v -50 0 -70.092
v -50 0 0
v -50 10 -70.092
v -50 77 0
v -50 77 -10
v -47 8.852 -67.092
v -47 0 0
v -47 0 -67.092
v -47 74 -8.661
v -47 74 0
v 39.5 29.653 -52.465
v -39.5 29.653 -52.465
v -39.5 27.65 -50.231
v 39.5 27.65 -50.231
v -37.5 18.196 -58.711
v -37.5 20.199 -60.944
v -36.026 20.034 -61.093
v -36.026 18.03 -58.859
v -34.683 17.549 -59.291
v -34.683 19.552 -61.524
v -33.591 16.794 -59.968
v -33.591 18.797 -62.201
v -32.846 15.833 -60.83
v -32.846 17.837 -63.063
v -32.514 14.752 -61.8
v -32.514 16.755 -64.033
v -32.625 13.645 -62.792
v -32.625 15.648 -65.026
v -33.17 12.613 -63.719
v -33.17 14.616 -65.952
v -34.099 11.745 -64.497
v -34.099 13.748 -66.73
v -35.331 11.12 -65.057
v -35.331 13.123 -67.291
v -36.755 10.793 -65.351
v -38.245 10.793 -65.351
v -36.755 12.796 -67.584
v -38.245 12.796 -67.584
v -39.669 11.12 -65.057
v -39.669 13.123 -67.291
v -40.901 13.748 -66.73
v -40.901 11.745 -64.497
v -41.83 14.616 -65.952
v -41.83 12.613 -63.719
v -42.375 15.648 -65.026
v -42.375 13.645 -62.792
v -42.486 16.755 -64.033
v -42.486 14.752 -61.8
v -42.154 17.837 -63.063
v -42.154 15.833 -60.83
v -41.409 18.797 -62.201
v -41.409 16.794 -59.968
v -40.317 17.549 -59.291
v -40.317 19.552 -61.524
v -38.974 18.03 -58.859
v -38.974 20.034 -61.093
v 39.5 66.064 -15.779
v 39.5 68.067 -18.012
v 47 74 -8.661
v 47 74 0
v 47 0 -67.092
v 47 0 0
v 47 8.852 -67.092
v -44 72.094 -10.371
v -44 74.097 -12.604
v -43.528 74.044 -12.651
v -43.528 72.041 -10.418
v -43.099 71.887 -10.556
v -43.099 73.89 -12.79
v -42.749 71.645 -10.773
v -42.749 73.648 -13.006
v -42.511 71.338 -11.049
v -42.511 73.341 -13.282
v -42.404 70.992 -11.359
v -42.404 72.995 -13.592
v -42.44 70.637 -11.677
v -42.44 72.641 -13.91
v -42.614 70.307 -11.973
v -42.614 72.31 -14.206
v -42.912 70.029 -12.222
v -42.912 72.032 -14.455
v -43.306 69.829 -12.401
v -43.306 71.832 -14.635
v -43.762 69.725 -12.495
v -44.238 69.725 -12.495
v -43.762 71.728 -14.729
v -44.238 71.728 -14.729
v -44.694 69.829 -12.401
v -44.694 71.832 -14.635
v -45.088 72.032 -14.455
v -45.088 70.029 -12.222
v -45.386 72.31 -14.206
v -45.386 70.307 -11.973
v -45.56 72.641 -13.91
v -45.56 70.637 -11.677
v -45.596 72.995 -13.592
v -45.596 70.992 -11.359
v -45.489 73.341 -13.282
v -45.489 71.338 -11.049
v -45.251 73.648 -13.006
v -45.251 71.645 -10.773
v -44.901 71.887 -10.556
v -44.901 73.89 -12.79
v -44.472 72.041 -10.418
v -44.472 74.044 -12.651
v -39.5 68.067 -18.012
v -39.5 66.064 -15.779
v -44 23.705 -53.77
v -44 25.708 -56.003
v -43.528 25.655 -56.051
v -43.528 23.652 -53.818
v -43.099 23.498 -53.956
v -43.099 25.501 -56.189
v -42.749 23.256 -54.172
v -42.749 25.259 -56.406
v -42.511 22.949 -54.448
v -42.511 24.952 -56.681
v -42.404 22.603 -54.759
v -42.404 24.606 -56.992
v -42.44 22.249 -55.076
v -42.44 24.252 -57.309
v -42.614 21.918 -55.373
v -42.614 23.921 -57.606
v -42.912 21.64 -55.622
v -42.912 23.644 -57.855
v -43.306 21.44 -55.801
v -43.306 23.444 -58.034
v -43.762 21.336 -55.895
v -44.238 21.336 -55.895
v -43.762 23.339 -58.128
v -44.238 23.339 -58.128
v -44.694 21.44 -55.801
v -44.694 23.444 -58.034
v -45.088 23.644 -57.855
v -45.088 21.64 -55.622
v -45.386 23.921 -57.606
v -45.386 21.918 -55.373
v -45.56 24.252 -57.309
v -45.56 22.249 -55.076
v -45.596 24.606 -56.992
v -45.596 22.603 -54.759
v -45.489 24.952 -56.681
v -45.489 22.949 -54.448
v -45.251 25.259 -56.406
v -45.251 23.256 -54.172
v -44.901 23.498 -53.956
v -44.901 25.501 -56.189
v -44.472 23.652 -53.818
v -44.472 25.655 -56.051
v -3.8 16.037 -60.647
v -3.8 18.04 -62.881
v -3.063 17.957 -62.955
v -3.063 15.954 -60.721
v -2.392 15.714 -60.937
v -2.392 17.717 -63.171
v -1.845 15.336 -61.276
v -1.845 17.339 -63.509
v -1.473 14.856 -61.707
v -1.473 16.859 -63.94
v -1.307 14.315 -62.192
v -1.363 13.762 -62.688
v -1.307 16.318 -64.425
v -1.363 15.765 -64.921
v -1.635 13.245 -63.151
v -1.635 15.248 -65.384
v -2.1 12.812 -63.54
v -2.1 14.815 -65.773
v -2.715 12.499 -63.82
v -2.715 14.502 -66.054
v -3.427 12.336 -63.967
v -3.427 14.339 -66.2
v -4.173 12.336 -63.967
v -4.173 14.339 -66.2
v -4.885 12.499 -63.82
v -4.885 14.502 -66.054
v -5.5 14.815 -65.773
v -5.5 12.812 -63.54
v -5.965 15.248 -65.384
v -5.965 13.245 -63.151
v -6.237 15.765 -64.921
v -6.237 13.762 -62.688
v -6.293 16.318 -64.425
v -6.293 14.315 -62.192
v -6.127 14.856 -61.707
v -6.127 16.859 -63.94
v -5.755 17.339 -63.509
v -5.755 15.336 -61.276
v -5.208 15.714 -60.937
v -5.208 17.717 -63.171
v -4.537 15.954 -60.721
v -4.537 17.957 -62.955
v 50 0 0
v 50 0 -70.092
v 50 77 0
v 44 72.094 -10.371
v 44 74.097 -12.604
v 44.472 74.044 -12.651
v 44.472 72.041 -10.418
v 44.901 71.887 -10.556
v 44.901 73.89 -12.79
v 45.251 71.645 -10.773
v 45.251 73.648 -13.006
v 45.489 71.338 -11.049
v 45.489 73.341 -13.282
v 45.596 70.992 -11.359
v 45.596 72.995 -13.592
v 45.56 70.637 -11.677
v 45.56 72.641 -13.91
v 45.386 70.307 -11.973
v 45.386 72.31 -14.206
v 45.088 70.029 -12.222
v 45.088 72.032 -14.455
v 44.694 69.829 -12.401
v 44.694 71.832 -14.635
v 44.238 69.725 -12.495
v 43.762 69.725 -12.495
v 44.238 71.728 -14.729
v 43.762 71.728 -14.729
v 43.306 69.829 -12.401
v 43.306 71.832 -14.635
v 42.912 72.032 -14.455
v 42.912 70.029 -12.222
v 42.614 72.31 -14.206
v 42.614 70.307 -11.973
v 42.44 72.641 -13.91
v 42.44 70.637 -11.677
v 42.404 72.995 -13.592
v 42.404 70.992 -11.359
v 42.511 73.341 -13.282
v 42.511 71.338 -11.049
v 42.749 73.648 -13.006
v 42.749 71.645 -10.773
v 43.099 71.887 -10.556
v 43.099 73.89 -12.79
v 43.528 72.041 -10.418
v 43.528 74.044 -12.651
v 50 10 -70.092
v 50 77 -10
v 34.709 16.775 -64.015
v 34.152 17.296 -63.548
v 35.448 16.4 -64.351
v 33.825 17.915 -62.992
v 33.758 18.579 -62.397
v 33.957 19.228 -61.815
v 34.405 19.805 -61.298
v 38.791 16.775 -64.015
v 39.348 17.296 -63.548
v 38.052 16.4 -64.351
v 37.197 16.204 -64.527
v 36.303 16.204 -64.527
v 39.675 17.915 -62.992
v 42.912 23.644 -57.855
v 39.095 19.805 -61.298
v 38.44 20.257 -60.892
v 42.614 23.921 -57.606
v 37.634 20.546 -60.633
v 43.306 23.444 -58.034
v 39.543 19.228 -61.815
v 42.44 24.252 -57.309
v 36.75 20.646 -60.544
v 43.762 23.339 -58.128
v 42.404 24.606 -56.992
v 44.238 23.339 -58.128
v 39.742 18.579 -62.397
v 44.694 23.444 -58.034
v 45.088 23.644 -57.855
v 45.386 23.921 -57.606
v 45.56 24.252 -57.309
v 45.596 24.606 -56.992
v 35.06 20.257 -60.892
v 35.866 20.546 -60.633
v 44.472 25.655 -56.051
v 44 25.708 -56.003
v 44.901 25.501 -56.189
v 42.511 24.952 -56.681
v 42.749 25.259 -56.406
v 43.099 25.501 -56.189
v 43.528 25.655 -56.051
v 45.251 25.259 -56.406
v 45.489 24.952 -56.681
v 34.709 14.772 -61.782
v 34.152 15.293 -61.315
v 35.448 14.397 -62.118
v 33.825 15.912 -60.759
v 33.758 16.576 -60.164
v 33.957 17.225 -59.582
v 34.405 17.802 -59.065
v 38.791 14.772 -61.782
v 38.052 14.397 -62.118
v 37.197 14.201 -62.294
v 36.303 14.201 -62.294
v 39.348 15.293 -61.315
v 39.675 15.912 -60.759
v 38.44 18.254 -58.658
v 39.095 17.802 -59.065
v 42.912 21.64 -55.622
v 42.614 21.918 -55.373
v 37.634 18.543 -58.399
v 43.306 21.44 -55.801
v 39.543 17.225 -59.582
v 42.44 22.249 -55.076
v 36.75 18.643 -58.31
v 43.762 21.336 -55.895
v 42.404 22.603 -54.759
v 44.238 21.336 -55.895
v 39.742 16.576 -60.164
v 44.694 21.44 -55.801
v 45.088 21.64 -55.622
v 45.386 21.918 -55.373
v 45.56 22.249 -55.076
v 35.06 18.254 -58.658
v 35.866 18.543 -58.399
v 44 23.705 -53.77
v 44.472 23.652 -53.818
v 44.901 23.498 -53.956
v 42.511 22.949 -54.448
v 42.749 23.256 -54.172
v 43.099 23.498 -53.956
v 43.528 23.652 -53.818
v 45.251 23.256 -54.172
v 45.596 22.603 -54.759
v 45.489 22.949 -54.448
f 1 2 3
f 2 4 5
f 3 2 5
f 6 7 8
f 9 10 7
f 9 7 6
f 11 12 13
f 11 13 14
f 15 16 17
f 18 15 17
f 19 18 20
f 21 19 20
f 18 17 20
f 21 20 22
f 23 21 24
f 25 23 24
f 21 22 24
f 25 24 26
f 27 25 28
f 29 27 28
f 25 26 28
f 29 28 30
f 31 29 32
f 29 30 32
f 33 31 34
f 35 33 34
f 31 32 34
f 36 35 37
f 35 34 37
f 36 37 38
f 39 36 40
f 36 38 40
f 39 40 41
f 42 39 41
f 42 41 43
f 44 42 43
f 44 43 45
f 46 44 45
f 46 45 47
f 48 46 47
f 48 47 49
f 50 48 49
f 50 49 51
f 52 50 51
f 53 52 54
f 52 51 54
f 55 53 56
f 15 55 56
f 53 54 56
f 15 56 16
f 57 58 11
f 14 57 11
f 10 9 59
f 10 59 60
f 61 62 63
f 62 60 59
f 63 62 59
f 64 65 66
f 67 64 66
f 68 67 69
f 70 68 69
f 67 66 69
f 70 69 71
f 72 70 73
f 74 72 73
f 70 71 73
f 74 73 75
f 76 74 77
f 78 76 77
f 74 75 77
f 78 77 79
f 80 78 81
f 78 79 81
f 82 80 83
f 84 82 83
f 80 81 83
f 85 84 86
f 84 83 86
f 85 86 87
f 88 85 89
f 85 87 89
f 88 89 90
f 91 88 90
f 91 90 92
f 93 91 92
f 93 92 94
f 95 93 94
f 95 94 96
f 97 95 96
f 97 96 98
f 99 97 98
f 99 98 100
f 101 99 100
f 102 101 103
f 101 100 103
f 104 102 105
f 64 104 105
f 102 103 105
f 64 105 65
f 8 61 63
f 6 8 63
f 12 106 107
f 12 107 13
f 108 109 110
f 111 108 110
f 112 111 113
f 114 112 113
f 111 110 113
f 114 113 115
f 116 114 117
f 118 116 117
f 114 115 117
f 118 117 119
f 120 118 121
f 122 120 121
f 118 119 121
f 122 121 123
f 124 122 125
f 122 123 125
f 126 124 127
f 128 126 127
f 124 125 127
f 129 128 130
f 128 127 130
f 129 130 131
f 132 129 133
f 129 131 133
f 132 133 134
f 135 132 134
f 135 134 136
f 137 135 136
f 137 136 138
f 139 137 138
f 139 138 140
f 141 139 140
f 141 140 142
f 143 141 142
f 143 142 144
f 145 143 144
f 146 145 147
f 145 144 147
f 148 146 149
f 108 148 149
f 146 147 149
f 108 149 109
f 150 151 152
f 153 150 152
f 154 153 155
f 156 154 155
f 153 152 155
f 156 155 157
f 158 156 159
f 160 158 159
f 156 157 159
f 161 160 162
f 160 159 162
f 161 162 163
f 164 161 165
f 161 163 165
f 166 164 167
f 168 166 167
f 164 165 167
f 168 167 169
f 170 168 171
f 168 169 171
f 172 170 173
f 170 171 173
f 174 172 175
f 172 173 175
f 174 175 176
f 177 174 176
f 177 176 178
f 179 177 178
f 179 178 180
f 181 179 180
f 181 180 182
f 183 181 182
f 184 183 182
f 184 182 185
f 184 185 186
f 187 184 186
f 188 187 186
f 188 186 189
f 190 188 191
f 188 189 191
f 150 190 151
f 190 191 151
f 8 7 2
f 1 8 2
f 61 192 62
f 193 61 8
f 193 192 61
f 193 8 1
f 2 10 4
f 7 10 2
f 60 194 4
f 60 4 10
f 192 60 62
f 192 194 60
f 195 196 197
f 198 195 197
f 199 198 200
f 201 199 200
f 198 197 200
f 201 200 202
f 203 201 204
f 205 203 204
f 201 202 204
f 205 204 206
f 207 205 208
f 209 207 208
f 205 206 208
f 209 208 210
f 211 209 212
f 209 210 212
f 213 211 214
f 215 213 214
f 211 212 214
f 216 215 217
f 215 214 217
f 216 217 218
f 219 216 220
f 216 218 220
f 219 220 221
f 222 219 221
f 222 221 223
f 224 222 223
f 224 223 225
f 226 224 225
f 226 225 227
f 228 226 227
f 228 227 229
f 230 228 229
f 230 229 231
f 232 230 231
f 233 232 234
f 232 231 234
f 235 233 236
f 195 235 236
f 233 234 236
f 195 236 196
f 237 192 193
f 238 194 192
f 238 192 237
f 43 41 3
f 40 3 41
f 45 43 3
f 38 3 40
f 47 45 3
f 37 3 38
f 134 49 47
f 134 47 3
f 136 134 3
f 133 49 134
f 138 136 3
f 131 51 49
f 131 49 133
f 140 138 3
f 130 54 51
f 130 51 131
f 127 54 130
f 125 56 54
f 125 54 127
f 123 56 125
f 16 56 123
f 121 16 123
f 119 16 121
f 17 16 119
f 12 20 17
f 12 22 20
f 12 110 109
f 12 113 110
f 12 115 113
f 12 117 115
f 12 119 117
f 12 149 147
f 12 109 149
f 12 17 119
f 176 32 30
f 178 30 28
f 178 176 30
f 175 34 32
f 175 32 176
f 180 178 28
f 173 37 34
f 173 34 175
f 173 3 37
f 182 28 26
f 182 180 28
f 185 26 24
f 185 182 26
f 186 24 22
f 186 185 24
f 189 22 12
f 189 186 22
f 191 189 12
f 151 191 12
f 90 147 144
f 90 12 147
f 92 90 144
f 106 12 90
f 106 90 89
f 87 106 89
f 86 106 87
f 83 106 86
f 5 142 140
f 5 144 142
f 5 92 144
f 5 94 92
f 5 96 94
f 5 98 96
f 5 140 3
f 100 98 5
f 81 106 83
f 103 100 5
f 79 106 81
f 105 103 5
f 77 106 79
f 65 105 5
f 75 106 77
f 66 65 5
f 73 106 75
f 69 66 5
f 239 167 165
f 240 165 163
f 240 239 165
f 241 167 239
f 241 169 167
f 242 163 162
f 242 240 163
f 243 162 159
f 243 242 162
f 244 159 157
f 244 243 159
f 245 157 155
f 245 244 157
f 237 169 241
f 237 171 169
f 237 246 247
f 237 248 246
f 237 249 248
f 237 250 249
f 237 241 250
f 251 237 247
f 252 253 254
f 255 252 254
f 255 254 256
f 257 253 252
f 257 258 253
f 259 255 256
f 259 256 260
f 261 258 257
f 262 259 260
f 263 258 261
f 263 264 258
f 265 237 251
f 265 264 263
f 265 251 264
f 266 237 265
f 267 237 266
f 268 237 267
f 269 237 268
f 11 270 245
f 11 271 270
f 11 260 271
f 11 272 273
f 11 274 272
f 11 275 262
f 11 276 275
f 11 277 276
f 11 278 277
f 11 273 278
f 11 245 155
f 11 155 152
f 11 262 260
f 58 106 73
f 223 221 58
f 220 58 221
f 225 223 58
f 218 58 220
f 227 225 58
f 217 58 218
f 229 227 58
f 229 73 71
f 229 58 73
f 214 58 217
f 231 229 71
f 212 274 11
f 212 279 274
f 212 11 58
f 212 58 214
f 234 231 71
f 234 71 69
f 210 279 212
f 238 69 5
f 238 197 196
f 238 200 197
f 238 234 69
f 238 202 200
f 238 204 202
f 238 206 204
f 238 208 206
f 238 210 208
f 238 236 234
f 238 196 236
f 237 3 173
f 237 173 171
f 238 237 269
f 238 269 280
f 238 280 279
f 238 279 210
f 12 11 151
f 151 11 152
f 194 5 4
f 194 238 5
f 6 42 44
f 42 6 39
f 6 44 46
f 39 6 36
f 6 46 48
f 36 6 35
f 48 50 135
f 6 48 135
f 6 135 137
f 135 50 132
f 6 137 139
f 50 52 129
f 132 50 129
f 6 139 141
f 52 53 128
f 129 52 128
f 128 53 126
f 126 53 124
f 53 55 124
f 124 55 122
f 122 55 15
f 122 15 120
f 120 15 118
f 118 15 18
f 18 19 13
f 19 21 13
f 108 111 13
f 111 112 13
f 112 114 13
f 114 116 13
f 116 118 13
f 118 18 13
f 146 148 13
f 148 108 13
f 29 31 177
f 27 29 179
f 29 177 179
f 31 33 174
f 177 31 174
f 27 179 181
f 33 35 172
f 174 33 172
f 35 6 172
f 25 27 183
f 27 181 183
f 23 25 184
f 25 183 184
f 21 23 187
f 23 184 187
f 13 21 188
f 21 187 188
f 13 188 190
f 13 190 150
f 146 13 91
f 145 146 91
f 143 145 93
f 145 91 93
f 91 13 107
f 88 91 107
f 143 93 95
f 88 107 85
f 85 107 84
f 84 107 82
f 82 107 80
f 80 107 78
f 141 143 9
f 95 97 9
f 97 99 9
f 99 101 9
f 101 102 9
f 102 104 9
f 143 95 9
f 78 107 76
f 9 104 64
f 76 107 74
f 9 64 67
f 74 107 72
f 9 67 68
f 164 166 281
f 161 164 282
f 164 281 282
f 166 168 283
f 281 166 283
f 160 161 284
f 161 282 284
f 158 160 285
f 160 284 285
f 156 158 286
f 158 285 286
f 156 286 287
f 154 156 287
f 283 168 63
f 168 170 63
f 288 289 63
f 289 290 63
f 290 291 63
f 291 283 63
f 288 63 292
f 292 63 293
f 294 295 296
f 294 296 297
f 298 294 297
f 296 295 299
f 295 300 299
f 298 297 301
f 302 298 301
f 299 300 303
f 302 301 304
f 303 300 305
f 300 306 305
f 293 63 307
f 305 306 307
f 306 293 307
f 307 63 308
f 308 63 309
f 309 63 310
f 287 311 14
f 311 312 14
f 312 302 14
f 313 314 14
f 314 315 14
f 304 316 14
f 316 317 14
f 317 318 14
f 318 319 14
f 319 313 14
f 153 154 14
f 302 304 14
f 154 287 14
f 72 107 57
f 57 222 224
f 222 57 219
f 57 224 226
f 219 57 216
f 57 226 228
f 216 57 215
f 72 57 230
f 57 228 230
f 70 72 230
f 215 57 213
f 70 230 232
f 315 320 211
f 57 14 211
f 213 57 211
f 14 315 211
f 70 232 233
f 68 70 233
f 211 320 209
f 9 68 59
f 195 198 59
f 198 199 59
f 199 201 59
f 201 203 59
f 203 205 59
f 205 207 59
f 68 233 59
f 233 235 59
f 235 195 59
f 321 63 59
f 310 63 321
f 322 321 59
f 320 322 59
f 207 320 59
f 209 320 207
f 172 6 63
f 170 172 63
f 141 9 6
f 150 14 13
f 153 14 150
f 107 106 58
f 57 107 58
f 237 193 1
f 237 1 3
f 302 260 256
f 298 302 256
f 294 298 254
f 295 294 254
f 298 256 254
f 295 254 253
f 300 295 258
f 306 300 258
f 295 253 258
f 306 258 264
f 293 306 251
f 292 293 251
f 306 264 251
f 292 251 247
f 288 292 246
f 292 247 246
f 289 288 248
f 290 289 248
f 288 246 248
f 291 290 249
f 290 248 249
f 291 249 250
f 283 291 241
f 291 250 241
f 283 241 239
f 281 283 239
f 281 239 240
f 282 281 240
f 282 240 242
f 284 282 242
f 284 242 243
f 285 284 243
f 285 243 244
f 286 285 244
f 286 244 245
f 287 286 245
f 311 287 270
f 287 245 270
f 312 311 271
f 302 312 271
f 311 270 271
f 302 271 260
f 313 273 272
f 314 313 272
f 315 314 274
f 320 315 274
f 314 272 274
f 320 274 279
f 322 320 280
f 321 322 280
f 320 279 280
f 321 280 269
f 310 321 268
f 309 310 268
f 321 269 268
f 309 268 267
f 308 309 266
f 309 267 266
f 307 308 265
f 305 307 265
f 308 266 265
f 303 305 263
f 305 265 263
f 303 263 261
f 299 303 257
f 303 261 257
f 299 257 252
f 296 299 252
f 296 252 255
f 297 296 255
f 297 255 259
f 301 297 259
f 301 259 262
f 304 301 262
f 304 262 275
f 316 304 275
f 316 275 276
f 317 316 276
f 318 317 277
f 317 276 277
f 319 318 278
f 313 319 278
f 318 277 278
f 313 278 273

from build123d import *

# Parameters (mm, degrees)
RESSALTO_EXTRUS_O1_DEPTH = 50
CASCA1_T                 = -3
ESBO_O4_R                = 1.6
ESBO_O4_R_2              = 5
ESBO_O4_R_3              = 3
ESBO_O4_R_4              = 2.5
ESBO_O4_W                = 79
ESBO_O4_H                = 51.6
CORTE_EXTRUS_O1_DEPTH    = 3


with BuildPart() as part:
    # Esboço2 → Ressalto-extrusão1 (new, symmetric)
    with BuildSketch(Plane(origin=(0, 0, 0), x_dir=(0, 0, -1), z_dir=(1, 0, 0))):
        Polygon((0, 0), (70.09159675, 0), (70.09159675, 10), (10, 77), (0, 77), align=None)
    extrude(amount=RESSALTO_EXTRUS_O1_DEPTH, both=True)

    # Casca1
    casca1_openings = [part.faces().sort_by_distance(p)[0] for p in [
        (0, 0, -35.045798375),
        (0, 38.5, 0),
    ]]
    offset(amount=CASCA1_T, openings=casca1_openings, kind=Kind.INTERSECTION)

    # Esboço4 → Corte-extrusão1 (cut)
    with BuildSketch(Plane(origin=(0, 39.297329608, -43.815129338), x_dir=(1, 0, 0), z_dir=(0, 0.6676844083366051, -0.7444444444444445))):
        with Locations(Location((-44, 19.854621861, 0), (0, 0, 270))):
            Circle(ESBO_O4_R)
        with Locations(Location((-44, -45.145378139, 0), (0, 0, 270))):
            Circle(ESBO_O4_R)
        with Locations(Location((44, -45.145378139, 0), (0, 0, 270))):
            Circle(ESBO_O4_R)
        with Locations(Location((44, 19.854621861, 0), (0, 0, 270))):
            Circle(ESBO_O4_R)
        with Locations(Location((-37.5, 30.654621861, 0), (0, 0, 270))):
            Circle(ESBO_O4_R_2)
        with Locations(Location((36.75, 28.054621861, 0), (0, 0, 270))):
            Circle(ESBO_O4_R_3)
        with Locations(Location((-3.8, 31.054621861, 0), (0, 0, 270))):
            Circle(ESBO_O4_R_4)
        with Locations((0, -12.845378139)):
            Rectangle(ESBO_O4_W, ESBO_O4_H)
    extrude(amount=-CORTE_EXTRUS_O1_DEPTH, mode=Mode.SUBTRACT)


solid = part.part
